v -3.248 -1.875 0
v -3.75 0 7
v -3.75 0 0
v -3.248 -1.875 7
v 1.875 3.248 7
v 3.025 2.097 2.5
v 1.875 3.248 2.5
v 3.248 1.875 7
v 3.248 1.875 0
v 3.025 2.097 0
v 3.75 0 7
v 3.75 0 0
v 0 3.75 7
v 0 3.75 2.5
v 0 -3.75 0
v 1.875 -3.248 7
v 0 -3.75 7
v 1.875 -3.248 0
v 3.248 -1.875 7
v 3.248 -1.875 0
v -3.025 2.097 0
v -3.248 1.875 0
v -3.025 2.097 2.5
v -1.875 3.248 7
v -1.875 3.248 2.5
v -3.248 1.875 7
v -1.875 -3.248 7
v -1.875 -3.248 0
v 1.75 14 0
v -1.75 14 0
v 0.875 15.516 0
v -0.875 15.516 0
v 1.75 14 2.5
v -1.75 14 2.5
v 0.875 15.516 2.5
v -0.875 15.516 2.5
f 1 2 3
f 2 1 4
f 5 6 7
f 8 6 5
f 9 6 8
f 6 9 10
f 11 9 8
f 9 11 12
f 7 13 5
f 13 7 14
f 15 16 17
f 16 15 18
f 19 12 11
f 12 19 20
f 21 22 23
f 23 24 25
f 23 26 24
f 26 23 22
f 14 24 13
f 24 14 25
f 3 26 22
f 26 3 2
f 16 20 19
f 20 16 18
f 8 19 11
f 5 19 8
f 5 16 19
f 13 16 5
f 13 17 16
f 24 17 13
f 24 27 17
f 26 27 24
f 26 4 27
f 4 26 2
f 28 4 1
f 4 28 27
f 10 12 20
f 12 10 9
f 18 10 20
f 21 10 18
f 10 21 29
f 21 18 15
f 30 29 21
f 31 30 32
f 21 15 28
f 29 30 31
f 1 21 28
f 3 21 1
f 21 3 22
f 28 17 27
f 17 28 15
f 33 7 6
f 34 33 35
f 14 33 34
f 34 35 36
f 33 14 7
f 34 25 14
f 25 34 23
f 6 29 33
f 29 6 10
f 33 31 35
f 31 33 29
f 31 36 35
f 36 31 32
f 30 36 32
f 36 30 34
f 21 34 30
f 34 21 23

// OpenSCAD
module servo_arm(body_r = 7.5/2, arm_r1 = 6.5/2, arm_r2 = 3.5/2, arm_len = 14, arm_thickness = 2.5, body_thickness = 7) {
	cylinder(r = body_r, h = body_thickness);
	
	linear_extrude(height = arm_thickness) {
		circle(r = arm_r1);
		translate([0,arm_len,0]) circle(r = arm_r2);
		polygon(points = [ [-arm_r1, 0], [arm_r1, 0], [arm_r2, arm_len], [-arm_r2, arm_len] ]);
	}
}

servo_arm();
